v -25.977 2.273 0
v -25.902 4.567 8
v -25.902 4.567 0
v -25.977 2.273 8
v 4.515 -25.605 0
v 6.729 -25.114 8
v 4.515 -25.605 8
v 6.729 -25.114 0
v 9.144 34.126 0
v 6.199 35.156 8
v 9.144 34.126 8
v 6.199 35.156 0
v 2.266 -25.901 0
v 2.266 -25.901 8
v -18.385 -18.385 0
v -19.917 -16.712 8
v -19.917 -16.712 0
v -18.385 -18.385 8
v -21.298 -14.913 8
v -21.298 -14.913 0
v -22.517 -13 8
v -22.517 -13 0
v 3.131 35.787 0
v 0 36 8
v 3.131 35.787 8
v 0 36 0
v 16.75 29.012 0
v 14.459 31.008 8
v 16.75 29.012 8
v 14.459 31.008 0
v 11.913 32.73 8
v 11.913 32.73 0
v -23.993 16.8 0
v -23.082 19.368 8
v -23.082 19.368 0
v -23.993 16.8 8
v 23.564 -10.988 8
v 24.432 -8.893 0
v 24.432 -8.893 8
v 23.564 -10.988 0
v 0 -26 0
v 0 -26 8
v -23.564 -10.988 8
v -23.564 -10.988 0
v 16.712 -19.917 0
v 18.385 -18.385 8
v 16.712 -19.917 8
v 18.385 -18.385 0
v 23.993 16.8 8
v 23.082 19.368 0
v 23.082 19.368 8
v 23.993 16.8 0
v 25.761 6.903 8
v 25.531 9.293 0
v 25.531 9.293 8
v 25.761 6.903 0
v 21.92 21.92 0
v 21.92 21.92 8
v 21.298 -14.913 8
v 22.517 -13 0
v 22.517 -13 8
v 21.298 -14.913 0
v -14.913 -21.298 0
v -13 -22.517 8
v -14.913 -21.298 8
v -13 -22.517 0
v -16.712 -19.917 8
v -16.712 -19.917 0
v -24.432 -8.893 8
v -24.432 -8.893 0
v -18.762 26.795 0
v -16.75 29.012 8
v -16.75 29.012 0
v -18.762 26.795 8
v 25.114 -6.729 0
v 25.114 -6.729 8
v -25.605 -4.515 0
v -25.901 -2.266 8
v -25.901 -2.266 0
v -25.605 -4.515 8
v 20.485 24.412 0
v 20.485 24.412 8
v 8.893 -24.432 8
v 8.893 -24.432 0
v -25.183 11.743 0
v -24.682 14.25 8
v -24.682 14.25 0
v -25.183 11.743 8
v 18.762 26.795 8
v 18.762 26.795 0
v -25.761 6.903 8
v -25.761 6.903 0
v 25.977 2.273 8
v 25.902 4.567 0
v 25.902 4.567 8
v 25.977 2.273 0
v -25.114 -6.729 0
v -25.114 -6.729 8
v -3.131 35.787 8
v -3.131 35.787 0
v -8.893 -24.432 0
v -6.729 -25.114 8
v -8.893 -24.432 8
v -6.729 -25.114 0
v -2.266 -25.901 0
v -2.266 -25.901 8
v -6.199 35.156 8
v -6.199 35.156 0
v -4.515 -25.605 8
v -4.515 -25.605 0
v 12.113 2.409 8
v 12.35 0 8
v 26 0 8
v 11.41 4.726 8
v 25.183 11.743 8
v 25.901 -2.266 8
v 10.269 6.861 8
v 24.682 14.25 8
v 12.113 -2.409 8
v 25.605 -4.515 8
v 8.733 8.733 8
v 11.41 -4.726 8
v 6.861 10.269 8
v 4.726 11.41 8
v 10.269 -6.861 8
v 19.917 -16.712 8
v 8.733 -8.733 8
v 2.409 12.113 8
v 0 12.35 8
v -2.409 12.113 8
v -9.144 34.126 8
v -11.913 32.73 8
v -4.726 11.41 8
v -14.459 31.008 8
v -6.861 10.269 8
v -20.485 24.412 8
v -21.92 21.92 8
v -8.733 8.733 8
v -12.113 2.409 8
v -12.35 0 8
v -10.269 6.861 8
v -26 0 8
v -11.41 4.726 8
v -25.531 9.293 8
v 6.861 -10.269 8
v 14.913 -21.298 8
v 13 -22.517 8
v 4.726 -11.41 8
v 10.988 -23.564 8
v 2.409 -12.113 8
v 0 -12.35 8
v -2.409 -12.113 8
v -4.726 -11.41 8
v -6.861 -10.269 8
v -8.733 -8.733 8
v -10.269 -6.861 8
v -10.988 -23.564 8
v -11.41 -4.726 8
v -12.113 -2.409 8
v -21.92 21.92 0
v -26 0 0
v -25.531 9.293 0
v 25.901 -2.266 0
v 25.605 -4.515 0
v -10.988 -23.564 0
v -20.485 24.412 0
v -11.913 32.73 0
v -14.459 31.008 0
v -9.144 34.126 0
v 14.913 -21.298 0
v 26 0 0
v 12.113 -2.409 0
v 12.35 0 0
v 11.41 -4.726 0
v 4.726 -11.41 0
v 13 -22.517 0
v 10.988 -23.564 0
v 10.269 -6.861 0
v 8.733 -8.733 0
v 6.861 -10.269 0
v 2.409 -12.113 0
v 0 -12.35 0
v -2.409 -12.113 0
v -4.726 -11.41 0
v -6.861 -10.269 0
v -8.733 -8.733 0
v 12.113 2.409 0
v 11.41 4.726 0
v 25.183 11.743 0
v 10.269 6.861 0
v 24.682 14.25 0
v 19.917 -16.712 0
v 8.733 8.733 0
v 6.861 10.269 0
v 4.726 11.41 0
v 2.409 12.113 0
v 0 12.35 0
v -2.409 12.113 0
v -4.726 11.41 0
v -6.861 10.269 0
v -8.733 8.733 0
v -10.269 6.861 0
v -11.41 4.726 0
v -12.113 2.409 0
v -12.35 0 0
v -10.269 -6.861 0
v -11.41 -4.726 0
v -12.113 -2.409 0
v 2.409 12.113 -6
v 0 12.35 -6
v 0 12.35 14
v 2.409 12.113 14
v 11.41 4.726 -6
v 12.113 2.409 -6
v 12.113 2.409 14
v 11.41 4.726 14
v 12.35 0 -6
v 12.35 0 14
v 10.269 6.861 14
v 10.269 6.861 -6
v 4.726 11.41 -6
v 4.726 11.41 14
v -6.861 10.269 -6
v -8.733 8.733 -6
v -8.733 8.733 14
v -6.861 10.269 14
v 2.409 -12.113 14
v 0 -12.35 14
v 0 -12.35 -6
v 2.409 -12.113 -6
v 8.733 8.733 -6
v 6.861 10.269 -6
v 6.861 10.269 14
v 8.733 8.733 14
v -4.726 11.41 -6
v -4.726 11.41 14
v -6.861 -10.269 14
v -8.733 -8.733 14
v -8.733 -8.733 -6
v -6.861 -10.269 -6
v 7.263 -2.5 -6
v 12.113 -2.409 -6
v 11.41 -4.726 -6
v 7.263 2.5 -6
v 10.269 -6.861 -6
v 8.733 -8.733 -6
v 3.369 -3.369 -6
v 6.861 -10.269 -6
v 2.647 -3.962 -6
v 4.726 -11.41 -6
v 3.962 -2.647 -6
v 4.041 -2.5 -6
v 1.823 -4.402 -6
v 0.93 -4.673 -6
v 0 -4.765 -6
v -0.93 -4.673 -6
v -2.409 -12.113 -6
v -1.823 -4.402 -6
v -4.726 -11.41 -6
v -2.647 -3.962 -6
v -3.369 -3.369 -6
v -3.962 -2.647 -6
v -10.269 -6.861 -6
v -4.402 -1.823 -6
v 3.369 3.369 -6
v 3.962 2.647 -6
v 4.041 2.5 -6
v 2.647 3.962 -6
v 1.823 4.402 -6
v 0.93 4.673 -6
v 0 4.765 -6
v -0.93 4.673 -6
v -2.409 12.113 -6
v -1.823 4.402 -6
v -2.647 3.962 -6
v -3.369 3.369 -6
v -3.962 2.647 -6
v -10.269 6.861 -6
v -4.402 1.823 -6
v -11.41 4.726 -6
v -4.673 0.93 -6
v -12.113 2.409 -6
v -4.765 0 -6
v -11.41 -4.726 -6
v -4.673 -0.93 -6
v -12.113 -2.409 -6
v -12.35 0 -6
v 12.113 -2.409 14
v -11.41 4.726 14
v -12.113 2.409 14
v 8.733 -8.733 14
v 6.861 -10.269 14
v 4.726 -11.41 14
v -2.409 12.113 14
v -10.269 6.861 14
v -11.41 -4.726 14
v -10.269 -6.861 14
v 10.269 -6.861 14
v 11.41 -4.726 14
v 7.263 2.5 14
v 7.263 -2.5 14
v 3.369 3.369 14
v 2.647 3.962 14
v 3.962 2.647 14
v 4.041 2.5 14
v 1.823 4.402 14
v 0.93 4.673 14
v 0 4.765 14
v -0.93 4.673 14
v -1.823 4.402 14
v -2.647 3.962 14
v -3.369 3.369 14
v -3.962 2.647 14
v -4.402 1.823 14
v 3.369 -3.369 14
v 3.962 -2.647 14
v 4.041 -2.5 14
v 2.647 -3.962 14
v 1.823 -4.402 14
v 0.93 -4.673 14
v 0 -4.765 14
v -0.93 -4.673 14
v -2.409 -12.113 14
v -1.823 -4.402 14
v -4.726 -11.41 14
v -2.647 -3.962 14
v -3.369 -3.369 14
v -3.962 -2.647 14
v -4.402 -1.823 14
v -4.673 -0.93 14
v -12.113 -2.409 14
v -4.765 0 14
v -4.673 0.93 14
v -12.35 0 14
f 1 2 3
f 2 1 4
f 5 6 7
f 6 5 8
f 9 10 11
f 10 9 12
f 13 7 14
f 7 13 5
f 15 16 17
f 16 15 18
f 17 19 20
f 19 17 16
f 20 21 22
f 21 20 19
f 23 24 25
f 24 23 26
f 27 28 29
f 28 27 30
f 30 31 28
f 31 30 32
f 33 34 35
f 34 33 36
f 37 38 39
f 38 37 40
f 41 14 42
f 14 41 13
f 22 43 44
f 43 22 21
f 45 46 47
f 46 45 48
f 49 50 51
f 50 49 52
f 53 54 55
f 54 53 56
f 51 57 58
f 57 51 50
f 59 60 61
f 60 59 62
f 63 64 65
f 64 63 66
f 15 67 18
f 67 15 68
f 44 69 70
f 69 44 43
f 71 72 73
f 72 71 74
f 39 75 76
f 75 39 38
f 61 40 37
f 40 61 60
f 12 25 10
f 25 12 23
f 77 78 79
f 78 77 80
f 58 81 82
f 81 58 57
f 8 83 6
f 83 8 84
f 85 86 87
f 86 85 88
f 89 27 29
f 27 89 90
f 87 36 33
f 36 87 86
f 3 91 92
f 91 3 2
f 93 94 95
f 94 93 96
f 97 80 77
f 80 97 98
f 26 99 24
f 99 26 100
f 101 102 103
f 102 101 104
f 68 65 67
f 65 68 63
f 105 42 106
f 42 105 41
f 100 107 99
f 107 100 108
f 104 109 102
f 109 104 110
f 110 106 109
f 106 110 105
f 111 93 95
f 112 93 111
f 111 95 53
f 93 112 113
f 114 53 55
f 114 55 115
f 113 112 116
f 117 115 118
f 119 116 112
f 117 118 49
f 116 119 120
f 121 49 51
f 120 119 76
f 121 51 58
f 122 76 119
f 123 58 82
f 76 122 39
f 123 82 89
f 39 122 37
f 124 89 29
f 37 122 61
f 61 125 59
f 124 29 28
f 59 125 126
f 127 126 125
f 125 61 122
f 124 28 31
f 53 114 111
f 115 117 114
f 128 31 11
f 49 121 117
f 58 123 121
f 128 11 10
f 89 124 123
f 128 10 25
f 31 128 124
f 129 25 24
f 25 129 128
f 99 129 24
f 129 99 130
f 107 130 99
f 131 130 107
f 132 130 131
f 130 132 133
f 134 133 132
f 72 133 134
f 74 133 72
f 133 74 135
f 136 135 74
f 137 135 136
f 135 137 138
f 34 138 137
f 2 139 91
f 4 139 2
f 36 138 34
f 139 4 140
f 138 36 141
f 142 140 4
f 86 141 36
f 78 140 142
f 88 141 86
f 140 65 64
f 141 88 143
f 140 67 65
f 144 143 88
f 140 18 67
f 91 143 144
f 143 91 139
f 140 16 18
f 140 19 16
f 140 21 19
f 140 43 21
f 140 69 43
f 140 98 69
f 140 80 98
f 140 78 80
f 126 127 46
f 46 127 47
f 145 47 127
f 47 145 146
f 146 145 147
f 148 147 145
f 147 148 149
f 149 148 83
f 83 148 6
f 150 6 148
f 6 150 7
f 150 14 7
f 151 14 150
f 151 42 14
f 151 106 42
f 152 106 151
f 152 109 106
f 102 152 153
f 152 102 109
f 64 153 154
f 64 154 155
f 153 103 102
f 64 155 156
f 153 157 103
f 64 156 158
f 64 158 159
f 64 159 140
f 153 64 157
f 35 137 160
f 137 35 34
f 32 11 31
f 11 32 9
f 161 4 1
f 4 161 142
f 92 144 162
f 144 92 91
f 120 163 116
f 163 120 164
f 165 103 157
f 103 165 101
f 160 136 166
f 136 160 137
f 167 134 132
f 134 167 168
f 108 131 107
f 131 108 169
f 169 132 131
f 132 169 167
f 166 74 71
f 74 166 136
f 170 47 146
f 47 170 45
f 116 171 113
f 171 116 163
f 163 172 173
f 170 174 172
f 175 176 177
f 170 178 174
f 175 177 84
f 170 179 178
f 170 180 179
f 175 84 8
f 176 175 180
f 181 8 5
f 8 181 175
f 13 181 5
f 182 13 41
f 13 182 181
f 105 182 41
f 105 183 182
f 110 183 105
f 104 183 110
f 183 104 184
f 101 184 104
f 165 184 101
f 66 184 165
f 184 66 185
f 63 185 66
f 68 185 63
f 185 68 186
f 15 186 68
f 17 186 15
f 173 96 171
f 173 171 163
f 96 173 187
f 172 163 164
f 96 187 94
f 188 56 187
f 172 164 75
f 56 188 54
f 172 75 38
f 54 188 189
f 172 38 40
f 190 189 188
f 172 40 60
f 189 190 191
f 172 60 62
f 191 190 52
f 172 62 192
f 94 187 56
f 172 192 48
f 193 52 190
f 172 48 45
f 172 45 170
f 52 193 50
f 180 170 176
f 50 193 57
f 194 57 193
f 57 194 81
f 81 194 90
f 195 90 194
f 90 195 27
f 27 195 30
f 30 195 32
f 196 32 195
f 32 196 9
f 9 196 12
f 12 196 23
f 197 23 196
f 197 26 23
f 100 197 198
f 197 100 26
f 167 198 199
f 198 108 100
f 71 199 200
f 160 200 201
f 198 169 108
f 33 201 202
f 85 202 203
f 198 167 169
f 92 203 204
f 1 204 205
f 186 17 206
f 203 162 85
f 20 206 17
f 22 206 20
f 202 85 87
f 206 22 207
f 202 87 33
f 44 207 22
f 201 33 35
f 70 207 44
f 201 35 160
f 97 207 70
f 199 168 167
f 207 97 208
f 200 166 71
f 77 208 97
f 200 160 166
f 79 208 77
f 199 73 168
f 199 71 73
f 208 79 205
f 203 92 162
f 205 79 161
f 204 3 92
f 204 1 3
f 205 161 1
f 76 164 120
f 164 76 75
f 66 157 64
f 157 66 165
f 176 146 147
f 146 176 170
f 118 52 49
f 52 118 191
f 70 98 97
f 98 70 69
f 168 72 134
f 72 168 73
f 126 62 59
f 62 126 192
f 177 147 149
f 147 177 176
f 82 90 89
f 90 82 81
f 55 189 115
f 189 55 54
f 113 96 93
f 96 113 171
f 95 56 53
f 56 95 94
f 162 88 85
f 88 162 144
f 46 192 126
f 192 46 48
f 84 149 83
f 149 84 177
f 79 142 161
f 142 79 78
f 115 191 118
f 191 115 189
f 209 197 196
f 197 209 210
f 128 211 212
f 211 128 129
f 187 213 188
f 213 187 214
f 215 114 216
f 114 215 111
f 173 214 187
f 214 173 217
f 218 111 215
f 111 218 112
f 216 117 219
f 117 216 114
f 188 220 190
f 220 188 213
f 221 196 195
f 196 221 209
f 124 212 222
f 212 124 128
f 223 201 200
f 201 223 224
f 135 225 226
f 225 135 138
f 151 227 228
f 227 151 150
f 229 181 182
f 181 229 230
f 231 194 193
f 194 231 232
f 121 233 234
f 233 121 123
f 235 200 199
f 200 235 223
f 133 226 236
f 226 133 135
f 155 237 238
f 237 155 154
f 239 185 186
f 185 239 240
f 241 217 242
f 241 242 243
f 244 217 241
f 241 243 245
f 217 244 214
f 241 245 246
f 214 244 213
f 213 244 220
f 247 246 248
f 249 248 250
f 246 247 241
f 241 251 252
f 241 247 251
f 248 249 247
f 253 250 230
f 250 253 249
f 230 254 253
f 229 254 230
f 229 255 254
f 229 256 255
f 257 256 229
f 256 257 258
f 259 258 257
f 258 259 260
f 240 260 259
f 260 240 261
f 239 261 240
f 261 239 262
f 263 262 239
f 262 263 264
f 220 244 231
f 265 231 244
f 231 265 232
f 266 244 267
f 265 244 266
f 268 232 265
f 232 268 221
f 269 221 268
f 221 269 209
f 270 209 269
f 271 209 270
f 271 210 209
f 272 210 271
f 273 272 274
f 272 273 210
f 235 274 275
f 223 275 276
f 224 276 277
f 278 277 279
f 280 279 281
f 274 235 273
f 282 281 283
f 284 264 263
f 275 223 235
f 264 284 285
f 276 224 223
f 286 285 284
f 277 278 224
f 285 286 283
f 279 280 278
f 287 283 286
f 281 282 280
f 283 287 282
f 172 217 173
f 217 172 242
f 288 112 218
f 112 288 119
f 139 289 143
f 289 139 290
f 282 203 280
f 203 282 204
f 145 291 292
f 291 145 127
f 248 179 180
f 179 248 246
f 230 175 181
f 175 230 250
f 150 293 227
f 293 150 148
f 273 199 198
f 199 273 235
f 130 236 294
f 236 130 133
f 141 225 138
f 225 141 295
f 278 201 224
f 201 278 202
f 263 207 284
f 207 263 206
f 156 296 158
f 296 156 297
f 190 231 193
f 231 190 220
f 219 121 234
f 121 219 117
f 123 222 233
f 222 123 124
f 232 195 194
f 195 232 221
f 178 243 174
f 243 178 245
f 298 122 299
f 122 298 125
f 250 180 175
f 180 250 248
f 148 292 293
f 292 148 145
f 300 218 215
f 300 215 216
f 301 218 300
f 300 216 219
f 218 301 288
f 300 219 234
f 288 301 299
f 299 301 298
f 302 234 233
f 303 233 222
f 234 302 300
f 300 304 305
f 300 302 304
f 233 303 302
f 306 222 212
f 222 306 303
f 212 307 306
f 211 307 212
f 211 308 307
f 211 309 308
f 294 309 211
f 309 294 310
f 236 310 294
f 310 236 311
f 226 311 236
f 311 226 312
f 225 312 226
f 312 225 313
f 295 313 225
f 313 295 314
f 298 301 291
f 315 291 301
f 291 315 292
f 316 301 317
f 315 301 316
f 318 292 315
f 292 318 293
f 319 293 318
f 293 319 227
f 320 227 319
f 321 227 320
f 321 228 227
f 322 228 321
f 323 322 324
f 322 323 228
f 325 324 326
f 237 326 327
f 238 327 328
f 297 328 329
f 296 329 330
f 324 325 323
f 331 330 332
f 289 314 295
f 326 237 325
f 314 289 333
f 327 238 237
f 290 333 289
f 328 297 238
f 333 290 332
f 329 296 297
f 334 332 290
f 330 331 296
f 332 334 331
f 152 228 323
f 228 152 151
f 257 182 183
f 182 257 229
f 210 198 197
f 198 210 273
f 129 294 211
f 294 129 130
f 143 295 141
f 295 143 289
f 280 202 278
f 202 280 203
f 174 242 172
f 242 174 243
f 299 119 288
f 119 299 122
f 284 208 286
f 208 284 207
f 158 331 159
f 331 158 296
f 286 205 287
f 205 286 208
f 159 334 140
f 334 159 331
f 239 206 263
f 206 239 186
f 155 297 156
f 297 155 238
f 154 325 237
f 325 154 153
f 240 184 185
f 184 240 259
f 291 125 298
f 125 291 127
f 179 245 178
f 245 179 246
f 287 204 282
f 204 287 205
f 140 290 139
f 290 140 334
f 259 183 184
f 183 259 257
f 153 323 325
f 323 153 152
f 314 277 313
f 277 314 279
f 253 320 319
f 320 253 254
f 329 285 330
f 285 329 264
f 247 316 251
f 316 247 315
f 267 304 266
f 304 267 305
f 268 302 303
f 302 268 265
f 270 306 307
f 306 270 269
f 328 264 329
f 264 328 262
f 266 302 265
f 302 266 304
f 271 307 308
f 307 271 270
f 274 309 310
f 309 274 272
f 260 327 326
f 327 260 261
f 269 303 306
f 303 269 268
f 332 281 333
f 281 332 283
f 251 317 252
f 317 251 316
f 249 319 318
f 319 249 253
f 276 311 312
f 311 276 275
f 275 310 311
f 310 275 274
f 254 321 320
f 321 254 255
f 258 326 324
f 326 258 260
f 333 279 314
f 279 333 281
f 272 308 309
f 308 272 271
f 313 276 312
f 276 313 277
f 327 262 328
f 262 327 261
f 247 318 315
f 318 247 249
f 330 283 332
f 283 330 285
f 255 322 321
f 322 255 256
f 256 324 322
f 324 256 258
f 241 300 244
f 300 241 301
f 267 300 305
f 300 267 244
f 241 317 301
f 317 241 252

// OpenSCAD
$fn = 32;

// ----------------------------------------------------------------------
// Cam: base radius 26 mm with a 10 mm lift over 180 degrees
// ----------------------------------------------------------------------

// --- parameters (mm) ---
base_r = 26;              // base radius
lift = 10;                // lift height above the base radius
lift_span = 180;          // angular width of the lift
lift_start = 0;           // angle where the lift starts
cam_t = 8;                // cam plate thickness
hub_d = 24.7;             // hub diameter
hub_h = 20;               // hub height
bore_d = 9.53;            // bore
key_w = 5;                // keyway width
key_depth = 2.5;          // keyway depth

cam_profile = [[26, 0], [25.977, 2.273], [25.902, 4.567], [25.761, 6.903], [25.531, 9.293], [25.183, 11.743], [24.682, 14.25], [23.993, 16.8], [23.082, 19.368], [21.92, 21.92], [20.485, 24.412], [18.762, 26.795], [16.75, 29.012], [14.459, 31.008], [11.913, 32.73], [9.144, 34.126], [6.199, 35.156], [3.131, 35.787], [0, 36], [-3.131, 35.787], [-6.199, 35.156], [-9.144, 34.126], [-11.913, 32.73], [-14.459, 31.008], [-16.75, 29.012], [-18.762, 26.795], [-20.485, 24.412], [-21.92, 21.92], [-23.082, 19.368], [-23.993, 16.8], [-24.682, 14.25], [-25.183, 11.743], [-25.531, 9.293], [-25.761, 6.903], [-25.902, 4.567], [-25.977, 2.273], [-26, 0], [-25.901, -2.266], [-25.605, -4.515], [-25.114, -6.729], [-24.432, -8.893], [-23.564, -10.988], [-22.517, -13], [-21.298, -14.913], [-19.917, -16.712], [-18.385, -18.385], [-16.712, -19.917], [-14.913, -21.298], [-13, -22.517], [-10.988, -23.564], [-8.893, -24.432], [-6.729, -25.114], [-4.515, -25.605], [-2.266, -25.901], [0, -26], [2.266, -25.901], [4.515, -25.605], [6.729, -25.114], [8.893, -24.432], [10.988, -23.564], [13, -22.517], [14.913, -21.298], [16.712, -19.917], [18.385, -18.385], [19.917, -16.712], [21.298, -14.913], [22.517, -13], [23.564, -10.988], [24.432, -8.893], [25.114, -6.729], [25.605, -4.515], [25.901, -2.266]];

difference() {
  union() {
    linear_extrude(height = cam_t) polygon(cam_profile);
    /* hub, proud of the cam plate on both sides */
    translate([0, 0, -6]) cylinder(h = hub_h, d = hub_d);
  }
  /* bore through the hub, 2.5 mm clear on both faces */
  translate([0, 0, -8.5]) cylinder(h = hub_h + 5, d = bore_d);
  /* keyway, milled through the whole hub */
  translate([2.263, -2.5, -8.5]) cube([5, 5, 25]);
}
